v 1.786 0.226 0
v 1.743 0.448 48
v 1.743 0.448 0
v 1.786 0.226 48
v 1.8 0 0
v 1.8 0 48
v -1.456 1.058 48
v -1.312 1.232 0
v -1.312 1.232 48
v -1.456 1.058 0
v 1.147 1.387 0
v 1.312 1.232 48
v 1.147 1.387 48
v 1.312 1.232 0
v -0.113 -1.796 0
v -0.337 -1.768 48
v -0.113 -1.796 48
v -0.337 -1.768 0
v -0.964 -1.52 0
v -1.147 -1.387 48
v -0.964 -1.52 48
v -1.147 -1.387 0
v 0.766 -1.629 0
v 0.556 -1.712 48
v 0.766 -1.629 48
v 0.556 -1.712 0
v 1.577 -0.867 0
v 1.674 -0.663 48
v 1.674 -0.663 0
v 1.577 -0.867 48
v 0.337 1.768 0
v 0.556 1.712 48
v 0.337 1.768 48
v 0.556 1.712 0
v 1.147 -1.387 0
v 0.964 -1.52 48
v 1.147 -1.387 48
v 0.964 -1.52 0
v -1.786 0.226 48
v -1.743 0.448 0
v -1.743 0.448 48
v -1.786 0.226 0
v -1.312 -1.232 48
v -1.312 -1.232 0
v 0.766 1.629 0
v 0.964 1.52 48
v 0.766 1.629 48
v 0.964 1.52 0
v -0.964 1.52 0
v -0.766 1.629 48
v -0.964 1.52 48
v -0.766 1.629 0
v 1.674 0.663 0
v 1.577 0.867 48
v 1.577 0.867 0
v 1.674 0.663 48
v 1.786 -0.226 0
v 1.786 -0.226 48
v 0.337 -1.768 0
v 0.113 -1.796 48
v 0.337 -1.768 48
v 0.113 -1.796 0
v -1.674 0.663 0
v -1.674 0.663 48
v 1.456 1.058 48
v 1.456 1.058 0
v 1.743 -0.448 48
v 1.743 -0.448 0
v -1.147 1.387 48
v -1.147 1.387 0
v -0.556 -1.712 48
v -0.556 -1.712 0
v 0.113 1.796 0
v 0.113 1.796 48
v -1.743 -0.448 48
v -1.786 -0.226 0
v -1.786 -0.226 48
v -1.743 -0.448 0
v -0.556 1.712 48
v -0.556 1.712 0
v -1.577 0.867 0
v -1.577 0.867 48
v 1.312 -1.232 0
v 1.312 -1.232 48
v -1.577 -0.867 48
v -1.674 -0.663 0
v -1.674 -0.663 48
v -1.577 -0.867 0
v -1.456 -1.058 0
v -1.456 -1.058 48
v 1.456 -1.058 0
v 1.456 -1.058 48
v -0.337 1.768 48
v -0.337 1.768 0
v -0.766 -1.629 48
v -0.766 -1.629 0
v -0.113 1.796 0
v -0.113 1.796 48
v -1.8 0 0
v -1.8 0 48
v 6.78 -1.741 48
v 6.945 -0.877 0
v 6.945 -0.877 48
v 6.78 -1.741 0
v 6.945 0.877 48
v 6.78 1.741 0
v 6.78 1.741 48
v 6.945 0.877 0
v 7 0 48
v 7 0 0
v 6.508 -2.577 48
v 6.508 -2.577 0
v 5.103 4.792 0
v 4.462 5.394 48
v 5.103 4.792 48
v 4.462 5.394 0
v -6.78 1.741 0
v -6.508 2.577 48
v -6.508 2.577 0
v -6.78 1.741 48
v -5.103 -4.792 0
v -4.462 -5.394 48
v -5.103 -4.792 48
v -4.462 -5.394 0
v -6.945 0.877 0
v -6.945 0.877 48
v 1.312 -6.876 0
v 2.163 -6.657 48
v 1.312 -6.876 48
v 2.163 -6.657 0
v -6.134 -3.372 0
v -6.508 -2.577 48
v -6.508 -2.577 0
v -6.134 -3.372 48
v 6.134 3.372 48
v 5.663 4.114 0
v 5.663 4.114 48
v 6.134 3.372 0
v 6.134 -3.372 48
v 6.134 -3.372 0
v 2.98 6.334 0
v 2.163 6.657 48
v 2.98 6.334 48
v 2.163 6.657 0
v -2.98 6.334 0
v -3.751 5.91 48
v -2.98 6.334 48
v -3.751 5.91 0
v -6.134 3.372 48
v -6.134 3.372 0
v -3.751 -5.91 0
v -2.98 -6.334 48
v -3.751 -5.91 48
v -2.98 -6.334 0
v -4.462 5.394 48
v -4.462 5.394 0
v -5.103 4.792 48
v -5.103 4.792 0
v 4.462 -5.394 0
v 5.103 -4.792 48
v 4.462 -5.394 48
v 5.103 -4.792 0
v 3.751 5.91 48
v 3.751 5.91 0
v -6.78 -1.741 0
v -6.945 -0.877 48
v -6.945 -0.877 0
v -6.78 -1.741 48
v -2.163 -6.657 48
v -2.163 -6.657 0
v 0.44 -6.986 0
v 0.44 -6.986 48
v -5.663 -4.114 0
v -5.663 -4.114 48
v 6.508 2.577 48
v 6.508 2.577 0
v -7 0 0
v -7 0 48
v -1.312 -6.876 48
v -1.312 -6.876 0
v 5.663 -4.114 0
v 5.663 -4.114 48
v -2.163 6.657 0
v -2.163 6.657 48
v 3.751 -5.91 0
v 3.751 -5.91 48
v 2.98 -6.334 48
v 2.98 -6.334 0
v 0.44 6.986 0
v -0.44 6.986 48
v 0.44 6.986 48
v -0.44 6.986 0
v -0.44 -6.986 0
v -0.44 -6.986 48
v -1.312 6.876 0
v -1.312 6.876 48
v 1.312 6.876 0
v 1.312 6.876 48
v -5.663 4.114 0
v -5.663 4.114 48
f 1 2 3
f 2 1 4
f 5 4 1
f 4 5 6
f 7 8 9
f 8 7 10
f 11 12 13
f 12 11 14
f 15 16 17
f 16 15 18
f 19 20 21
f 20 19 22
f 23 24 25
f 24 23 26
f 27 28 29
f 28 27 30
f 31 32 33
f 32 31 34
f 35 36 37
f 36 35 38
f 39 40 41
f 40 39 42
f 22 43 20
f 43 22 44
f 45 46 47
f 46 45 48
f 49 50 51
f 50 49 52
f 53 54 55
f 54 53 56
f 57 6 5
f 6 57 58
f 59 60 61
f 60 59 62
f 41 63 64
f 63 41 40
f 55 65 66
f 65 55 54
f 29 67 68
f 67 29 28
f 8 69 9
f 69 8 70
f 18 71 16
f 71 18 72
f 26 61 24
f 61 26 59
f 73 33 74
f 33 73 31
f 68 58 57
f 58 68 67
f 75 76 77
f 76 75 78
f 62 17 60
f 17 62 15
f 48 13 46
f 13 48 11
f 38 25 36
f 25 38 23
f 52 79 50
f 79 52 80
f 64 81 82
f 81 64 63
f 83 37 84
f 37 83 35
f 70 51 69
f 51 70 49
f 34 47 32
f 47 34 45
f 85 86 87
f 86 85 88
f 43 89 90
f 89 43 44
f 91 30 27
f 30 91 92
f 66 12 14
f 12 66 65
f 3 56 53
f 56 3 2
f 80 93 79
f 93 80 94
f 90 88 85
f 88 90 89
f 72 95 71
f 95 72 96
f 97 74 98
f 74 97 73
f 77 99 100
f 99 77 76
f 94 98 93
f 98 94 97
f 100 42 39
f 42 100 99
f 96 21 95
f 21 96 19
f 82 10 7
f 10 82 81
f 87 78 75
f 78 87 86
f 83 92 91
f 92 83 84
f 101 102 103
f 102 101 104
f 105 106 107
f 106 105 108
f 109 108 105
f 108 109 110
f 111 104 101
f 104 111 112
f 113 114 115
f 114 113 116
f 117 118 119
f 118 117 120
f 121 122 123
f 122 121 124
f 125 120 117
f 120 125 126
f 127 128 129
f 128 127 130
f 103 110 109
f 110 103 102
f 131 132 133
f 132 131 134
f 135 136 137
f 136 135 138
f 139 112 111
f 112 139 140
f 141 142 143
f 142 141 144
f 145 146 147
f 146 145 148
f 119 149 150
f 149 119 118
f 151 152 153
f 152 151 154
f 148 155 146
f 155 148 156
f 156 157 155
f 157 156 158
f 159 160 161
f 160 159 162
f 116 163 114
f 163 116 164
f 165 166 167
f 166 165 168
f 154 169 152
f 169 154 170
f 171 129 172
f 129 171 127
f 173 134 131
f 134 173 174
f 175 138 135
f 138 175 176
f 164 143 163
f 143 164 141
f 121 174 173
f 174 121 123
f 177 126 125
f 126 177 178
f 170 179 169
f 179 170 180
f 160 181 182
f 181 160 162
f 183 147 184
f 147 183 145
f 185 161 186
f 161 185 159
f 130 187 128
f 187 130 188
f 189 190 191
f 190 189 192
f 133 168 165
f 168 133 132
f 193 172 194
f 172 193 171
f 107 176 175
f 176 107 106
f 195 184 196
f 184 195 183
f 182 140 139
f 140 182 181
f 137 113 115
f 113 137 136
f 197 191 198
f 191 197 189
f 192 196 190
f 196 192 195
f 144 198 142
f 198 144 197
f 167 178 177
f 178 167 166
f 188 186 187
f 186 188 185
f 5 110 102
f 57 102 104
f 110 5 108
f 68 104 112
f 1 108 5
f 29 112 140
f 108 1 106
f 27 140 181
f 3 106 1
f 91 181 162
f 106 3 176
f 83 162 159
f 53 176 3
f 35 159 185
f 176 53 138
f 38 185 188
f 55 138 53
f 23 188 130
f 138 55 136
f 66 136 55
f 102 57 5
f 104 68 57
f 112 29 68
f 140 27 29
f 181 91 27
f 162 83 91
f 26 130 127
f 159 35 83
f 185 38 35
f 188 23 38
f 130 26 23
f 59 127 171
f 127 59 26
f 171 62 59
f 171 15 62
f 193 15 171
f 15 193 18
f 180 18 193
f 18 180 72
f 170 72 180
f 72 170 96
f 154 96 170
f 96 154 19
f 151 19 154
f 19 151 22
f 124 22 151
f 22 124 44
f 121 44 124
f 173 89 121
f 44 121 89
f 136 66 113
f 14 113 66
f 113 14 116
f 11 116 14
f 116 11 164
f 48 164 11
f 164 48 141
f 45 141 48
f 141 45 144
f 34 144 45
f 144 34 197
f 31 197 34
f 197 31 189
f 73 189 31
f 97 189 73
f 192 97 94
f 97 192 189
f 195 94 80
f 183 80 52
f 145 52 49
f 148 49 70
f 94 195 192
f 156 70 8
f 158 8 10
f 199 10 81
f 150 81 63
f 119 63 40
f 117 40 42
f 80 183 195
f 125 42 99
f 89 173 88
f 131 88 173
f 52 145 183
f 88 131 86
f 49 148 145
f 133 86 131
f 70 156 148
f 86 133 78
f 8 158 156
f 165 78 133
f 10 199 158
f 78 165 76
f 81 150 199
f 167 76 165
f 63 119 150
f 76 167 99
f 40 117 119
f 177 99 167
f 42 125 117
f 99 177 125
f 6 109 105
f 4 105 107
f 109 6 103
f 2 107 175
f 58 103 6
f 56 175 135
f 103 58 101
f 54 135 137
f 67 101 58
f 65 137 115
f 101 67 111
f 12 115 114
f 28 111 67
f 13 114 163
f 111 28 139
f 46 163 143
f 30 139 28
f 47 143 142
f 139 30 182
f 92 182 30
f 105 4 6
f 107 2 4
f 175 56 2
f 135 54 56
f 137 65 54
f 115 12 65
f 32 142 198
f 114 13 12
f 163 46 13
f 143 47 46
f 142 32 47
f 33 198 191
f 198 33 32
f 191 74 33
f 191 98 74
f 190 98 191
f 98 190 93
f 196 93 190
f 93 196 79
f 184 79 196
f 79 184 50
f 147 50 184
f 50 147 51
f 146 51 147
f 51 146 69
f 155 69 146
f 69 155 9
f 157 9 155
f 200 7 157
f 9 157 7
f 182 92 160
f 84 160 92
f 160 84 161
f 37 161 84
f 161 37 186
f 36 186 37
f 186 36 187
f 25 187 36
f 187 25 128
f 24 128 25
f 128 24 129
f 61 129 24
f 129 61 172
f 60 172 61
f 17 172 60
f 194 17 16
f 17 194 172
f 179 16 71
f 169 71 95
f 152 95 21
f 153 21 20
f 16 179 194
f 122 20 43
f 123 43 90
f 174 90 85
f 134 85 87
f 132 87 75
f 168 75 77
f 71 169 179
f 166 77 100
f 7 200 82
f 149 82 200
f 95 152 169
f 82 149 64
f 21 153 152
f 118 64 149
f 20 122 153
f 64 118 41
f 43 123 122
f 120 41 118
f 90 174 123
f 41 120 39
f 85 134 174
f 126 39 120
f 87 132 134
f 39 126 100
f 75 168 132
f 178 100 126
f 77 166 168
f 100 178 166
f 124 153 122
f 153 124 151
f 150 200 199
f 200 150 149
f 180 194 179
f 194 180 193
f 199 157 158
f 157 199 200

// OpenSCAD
$fn = 50;


difference() {
	union() {
		cylinder(h = 48, r = 7.0000000000);
	}
	union() {
		translate(v = [0.0000000000, 0.0000000000, -100.0000000000]) {
			cylinder(h = 200, r = 1.8000000000);
		}
		cylinder(h = 48, r = 1.8000000000);
		cylinder(h = 48, r = 1.8000000000);
		cylinder(h = 48, r = 1.8000000000);
	}
}
